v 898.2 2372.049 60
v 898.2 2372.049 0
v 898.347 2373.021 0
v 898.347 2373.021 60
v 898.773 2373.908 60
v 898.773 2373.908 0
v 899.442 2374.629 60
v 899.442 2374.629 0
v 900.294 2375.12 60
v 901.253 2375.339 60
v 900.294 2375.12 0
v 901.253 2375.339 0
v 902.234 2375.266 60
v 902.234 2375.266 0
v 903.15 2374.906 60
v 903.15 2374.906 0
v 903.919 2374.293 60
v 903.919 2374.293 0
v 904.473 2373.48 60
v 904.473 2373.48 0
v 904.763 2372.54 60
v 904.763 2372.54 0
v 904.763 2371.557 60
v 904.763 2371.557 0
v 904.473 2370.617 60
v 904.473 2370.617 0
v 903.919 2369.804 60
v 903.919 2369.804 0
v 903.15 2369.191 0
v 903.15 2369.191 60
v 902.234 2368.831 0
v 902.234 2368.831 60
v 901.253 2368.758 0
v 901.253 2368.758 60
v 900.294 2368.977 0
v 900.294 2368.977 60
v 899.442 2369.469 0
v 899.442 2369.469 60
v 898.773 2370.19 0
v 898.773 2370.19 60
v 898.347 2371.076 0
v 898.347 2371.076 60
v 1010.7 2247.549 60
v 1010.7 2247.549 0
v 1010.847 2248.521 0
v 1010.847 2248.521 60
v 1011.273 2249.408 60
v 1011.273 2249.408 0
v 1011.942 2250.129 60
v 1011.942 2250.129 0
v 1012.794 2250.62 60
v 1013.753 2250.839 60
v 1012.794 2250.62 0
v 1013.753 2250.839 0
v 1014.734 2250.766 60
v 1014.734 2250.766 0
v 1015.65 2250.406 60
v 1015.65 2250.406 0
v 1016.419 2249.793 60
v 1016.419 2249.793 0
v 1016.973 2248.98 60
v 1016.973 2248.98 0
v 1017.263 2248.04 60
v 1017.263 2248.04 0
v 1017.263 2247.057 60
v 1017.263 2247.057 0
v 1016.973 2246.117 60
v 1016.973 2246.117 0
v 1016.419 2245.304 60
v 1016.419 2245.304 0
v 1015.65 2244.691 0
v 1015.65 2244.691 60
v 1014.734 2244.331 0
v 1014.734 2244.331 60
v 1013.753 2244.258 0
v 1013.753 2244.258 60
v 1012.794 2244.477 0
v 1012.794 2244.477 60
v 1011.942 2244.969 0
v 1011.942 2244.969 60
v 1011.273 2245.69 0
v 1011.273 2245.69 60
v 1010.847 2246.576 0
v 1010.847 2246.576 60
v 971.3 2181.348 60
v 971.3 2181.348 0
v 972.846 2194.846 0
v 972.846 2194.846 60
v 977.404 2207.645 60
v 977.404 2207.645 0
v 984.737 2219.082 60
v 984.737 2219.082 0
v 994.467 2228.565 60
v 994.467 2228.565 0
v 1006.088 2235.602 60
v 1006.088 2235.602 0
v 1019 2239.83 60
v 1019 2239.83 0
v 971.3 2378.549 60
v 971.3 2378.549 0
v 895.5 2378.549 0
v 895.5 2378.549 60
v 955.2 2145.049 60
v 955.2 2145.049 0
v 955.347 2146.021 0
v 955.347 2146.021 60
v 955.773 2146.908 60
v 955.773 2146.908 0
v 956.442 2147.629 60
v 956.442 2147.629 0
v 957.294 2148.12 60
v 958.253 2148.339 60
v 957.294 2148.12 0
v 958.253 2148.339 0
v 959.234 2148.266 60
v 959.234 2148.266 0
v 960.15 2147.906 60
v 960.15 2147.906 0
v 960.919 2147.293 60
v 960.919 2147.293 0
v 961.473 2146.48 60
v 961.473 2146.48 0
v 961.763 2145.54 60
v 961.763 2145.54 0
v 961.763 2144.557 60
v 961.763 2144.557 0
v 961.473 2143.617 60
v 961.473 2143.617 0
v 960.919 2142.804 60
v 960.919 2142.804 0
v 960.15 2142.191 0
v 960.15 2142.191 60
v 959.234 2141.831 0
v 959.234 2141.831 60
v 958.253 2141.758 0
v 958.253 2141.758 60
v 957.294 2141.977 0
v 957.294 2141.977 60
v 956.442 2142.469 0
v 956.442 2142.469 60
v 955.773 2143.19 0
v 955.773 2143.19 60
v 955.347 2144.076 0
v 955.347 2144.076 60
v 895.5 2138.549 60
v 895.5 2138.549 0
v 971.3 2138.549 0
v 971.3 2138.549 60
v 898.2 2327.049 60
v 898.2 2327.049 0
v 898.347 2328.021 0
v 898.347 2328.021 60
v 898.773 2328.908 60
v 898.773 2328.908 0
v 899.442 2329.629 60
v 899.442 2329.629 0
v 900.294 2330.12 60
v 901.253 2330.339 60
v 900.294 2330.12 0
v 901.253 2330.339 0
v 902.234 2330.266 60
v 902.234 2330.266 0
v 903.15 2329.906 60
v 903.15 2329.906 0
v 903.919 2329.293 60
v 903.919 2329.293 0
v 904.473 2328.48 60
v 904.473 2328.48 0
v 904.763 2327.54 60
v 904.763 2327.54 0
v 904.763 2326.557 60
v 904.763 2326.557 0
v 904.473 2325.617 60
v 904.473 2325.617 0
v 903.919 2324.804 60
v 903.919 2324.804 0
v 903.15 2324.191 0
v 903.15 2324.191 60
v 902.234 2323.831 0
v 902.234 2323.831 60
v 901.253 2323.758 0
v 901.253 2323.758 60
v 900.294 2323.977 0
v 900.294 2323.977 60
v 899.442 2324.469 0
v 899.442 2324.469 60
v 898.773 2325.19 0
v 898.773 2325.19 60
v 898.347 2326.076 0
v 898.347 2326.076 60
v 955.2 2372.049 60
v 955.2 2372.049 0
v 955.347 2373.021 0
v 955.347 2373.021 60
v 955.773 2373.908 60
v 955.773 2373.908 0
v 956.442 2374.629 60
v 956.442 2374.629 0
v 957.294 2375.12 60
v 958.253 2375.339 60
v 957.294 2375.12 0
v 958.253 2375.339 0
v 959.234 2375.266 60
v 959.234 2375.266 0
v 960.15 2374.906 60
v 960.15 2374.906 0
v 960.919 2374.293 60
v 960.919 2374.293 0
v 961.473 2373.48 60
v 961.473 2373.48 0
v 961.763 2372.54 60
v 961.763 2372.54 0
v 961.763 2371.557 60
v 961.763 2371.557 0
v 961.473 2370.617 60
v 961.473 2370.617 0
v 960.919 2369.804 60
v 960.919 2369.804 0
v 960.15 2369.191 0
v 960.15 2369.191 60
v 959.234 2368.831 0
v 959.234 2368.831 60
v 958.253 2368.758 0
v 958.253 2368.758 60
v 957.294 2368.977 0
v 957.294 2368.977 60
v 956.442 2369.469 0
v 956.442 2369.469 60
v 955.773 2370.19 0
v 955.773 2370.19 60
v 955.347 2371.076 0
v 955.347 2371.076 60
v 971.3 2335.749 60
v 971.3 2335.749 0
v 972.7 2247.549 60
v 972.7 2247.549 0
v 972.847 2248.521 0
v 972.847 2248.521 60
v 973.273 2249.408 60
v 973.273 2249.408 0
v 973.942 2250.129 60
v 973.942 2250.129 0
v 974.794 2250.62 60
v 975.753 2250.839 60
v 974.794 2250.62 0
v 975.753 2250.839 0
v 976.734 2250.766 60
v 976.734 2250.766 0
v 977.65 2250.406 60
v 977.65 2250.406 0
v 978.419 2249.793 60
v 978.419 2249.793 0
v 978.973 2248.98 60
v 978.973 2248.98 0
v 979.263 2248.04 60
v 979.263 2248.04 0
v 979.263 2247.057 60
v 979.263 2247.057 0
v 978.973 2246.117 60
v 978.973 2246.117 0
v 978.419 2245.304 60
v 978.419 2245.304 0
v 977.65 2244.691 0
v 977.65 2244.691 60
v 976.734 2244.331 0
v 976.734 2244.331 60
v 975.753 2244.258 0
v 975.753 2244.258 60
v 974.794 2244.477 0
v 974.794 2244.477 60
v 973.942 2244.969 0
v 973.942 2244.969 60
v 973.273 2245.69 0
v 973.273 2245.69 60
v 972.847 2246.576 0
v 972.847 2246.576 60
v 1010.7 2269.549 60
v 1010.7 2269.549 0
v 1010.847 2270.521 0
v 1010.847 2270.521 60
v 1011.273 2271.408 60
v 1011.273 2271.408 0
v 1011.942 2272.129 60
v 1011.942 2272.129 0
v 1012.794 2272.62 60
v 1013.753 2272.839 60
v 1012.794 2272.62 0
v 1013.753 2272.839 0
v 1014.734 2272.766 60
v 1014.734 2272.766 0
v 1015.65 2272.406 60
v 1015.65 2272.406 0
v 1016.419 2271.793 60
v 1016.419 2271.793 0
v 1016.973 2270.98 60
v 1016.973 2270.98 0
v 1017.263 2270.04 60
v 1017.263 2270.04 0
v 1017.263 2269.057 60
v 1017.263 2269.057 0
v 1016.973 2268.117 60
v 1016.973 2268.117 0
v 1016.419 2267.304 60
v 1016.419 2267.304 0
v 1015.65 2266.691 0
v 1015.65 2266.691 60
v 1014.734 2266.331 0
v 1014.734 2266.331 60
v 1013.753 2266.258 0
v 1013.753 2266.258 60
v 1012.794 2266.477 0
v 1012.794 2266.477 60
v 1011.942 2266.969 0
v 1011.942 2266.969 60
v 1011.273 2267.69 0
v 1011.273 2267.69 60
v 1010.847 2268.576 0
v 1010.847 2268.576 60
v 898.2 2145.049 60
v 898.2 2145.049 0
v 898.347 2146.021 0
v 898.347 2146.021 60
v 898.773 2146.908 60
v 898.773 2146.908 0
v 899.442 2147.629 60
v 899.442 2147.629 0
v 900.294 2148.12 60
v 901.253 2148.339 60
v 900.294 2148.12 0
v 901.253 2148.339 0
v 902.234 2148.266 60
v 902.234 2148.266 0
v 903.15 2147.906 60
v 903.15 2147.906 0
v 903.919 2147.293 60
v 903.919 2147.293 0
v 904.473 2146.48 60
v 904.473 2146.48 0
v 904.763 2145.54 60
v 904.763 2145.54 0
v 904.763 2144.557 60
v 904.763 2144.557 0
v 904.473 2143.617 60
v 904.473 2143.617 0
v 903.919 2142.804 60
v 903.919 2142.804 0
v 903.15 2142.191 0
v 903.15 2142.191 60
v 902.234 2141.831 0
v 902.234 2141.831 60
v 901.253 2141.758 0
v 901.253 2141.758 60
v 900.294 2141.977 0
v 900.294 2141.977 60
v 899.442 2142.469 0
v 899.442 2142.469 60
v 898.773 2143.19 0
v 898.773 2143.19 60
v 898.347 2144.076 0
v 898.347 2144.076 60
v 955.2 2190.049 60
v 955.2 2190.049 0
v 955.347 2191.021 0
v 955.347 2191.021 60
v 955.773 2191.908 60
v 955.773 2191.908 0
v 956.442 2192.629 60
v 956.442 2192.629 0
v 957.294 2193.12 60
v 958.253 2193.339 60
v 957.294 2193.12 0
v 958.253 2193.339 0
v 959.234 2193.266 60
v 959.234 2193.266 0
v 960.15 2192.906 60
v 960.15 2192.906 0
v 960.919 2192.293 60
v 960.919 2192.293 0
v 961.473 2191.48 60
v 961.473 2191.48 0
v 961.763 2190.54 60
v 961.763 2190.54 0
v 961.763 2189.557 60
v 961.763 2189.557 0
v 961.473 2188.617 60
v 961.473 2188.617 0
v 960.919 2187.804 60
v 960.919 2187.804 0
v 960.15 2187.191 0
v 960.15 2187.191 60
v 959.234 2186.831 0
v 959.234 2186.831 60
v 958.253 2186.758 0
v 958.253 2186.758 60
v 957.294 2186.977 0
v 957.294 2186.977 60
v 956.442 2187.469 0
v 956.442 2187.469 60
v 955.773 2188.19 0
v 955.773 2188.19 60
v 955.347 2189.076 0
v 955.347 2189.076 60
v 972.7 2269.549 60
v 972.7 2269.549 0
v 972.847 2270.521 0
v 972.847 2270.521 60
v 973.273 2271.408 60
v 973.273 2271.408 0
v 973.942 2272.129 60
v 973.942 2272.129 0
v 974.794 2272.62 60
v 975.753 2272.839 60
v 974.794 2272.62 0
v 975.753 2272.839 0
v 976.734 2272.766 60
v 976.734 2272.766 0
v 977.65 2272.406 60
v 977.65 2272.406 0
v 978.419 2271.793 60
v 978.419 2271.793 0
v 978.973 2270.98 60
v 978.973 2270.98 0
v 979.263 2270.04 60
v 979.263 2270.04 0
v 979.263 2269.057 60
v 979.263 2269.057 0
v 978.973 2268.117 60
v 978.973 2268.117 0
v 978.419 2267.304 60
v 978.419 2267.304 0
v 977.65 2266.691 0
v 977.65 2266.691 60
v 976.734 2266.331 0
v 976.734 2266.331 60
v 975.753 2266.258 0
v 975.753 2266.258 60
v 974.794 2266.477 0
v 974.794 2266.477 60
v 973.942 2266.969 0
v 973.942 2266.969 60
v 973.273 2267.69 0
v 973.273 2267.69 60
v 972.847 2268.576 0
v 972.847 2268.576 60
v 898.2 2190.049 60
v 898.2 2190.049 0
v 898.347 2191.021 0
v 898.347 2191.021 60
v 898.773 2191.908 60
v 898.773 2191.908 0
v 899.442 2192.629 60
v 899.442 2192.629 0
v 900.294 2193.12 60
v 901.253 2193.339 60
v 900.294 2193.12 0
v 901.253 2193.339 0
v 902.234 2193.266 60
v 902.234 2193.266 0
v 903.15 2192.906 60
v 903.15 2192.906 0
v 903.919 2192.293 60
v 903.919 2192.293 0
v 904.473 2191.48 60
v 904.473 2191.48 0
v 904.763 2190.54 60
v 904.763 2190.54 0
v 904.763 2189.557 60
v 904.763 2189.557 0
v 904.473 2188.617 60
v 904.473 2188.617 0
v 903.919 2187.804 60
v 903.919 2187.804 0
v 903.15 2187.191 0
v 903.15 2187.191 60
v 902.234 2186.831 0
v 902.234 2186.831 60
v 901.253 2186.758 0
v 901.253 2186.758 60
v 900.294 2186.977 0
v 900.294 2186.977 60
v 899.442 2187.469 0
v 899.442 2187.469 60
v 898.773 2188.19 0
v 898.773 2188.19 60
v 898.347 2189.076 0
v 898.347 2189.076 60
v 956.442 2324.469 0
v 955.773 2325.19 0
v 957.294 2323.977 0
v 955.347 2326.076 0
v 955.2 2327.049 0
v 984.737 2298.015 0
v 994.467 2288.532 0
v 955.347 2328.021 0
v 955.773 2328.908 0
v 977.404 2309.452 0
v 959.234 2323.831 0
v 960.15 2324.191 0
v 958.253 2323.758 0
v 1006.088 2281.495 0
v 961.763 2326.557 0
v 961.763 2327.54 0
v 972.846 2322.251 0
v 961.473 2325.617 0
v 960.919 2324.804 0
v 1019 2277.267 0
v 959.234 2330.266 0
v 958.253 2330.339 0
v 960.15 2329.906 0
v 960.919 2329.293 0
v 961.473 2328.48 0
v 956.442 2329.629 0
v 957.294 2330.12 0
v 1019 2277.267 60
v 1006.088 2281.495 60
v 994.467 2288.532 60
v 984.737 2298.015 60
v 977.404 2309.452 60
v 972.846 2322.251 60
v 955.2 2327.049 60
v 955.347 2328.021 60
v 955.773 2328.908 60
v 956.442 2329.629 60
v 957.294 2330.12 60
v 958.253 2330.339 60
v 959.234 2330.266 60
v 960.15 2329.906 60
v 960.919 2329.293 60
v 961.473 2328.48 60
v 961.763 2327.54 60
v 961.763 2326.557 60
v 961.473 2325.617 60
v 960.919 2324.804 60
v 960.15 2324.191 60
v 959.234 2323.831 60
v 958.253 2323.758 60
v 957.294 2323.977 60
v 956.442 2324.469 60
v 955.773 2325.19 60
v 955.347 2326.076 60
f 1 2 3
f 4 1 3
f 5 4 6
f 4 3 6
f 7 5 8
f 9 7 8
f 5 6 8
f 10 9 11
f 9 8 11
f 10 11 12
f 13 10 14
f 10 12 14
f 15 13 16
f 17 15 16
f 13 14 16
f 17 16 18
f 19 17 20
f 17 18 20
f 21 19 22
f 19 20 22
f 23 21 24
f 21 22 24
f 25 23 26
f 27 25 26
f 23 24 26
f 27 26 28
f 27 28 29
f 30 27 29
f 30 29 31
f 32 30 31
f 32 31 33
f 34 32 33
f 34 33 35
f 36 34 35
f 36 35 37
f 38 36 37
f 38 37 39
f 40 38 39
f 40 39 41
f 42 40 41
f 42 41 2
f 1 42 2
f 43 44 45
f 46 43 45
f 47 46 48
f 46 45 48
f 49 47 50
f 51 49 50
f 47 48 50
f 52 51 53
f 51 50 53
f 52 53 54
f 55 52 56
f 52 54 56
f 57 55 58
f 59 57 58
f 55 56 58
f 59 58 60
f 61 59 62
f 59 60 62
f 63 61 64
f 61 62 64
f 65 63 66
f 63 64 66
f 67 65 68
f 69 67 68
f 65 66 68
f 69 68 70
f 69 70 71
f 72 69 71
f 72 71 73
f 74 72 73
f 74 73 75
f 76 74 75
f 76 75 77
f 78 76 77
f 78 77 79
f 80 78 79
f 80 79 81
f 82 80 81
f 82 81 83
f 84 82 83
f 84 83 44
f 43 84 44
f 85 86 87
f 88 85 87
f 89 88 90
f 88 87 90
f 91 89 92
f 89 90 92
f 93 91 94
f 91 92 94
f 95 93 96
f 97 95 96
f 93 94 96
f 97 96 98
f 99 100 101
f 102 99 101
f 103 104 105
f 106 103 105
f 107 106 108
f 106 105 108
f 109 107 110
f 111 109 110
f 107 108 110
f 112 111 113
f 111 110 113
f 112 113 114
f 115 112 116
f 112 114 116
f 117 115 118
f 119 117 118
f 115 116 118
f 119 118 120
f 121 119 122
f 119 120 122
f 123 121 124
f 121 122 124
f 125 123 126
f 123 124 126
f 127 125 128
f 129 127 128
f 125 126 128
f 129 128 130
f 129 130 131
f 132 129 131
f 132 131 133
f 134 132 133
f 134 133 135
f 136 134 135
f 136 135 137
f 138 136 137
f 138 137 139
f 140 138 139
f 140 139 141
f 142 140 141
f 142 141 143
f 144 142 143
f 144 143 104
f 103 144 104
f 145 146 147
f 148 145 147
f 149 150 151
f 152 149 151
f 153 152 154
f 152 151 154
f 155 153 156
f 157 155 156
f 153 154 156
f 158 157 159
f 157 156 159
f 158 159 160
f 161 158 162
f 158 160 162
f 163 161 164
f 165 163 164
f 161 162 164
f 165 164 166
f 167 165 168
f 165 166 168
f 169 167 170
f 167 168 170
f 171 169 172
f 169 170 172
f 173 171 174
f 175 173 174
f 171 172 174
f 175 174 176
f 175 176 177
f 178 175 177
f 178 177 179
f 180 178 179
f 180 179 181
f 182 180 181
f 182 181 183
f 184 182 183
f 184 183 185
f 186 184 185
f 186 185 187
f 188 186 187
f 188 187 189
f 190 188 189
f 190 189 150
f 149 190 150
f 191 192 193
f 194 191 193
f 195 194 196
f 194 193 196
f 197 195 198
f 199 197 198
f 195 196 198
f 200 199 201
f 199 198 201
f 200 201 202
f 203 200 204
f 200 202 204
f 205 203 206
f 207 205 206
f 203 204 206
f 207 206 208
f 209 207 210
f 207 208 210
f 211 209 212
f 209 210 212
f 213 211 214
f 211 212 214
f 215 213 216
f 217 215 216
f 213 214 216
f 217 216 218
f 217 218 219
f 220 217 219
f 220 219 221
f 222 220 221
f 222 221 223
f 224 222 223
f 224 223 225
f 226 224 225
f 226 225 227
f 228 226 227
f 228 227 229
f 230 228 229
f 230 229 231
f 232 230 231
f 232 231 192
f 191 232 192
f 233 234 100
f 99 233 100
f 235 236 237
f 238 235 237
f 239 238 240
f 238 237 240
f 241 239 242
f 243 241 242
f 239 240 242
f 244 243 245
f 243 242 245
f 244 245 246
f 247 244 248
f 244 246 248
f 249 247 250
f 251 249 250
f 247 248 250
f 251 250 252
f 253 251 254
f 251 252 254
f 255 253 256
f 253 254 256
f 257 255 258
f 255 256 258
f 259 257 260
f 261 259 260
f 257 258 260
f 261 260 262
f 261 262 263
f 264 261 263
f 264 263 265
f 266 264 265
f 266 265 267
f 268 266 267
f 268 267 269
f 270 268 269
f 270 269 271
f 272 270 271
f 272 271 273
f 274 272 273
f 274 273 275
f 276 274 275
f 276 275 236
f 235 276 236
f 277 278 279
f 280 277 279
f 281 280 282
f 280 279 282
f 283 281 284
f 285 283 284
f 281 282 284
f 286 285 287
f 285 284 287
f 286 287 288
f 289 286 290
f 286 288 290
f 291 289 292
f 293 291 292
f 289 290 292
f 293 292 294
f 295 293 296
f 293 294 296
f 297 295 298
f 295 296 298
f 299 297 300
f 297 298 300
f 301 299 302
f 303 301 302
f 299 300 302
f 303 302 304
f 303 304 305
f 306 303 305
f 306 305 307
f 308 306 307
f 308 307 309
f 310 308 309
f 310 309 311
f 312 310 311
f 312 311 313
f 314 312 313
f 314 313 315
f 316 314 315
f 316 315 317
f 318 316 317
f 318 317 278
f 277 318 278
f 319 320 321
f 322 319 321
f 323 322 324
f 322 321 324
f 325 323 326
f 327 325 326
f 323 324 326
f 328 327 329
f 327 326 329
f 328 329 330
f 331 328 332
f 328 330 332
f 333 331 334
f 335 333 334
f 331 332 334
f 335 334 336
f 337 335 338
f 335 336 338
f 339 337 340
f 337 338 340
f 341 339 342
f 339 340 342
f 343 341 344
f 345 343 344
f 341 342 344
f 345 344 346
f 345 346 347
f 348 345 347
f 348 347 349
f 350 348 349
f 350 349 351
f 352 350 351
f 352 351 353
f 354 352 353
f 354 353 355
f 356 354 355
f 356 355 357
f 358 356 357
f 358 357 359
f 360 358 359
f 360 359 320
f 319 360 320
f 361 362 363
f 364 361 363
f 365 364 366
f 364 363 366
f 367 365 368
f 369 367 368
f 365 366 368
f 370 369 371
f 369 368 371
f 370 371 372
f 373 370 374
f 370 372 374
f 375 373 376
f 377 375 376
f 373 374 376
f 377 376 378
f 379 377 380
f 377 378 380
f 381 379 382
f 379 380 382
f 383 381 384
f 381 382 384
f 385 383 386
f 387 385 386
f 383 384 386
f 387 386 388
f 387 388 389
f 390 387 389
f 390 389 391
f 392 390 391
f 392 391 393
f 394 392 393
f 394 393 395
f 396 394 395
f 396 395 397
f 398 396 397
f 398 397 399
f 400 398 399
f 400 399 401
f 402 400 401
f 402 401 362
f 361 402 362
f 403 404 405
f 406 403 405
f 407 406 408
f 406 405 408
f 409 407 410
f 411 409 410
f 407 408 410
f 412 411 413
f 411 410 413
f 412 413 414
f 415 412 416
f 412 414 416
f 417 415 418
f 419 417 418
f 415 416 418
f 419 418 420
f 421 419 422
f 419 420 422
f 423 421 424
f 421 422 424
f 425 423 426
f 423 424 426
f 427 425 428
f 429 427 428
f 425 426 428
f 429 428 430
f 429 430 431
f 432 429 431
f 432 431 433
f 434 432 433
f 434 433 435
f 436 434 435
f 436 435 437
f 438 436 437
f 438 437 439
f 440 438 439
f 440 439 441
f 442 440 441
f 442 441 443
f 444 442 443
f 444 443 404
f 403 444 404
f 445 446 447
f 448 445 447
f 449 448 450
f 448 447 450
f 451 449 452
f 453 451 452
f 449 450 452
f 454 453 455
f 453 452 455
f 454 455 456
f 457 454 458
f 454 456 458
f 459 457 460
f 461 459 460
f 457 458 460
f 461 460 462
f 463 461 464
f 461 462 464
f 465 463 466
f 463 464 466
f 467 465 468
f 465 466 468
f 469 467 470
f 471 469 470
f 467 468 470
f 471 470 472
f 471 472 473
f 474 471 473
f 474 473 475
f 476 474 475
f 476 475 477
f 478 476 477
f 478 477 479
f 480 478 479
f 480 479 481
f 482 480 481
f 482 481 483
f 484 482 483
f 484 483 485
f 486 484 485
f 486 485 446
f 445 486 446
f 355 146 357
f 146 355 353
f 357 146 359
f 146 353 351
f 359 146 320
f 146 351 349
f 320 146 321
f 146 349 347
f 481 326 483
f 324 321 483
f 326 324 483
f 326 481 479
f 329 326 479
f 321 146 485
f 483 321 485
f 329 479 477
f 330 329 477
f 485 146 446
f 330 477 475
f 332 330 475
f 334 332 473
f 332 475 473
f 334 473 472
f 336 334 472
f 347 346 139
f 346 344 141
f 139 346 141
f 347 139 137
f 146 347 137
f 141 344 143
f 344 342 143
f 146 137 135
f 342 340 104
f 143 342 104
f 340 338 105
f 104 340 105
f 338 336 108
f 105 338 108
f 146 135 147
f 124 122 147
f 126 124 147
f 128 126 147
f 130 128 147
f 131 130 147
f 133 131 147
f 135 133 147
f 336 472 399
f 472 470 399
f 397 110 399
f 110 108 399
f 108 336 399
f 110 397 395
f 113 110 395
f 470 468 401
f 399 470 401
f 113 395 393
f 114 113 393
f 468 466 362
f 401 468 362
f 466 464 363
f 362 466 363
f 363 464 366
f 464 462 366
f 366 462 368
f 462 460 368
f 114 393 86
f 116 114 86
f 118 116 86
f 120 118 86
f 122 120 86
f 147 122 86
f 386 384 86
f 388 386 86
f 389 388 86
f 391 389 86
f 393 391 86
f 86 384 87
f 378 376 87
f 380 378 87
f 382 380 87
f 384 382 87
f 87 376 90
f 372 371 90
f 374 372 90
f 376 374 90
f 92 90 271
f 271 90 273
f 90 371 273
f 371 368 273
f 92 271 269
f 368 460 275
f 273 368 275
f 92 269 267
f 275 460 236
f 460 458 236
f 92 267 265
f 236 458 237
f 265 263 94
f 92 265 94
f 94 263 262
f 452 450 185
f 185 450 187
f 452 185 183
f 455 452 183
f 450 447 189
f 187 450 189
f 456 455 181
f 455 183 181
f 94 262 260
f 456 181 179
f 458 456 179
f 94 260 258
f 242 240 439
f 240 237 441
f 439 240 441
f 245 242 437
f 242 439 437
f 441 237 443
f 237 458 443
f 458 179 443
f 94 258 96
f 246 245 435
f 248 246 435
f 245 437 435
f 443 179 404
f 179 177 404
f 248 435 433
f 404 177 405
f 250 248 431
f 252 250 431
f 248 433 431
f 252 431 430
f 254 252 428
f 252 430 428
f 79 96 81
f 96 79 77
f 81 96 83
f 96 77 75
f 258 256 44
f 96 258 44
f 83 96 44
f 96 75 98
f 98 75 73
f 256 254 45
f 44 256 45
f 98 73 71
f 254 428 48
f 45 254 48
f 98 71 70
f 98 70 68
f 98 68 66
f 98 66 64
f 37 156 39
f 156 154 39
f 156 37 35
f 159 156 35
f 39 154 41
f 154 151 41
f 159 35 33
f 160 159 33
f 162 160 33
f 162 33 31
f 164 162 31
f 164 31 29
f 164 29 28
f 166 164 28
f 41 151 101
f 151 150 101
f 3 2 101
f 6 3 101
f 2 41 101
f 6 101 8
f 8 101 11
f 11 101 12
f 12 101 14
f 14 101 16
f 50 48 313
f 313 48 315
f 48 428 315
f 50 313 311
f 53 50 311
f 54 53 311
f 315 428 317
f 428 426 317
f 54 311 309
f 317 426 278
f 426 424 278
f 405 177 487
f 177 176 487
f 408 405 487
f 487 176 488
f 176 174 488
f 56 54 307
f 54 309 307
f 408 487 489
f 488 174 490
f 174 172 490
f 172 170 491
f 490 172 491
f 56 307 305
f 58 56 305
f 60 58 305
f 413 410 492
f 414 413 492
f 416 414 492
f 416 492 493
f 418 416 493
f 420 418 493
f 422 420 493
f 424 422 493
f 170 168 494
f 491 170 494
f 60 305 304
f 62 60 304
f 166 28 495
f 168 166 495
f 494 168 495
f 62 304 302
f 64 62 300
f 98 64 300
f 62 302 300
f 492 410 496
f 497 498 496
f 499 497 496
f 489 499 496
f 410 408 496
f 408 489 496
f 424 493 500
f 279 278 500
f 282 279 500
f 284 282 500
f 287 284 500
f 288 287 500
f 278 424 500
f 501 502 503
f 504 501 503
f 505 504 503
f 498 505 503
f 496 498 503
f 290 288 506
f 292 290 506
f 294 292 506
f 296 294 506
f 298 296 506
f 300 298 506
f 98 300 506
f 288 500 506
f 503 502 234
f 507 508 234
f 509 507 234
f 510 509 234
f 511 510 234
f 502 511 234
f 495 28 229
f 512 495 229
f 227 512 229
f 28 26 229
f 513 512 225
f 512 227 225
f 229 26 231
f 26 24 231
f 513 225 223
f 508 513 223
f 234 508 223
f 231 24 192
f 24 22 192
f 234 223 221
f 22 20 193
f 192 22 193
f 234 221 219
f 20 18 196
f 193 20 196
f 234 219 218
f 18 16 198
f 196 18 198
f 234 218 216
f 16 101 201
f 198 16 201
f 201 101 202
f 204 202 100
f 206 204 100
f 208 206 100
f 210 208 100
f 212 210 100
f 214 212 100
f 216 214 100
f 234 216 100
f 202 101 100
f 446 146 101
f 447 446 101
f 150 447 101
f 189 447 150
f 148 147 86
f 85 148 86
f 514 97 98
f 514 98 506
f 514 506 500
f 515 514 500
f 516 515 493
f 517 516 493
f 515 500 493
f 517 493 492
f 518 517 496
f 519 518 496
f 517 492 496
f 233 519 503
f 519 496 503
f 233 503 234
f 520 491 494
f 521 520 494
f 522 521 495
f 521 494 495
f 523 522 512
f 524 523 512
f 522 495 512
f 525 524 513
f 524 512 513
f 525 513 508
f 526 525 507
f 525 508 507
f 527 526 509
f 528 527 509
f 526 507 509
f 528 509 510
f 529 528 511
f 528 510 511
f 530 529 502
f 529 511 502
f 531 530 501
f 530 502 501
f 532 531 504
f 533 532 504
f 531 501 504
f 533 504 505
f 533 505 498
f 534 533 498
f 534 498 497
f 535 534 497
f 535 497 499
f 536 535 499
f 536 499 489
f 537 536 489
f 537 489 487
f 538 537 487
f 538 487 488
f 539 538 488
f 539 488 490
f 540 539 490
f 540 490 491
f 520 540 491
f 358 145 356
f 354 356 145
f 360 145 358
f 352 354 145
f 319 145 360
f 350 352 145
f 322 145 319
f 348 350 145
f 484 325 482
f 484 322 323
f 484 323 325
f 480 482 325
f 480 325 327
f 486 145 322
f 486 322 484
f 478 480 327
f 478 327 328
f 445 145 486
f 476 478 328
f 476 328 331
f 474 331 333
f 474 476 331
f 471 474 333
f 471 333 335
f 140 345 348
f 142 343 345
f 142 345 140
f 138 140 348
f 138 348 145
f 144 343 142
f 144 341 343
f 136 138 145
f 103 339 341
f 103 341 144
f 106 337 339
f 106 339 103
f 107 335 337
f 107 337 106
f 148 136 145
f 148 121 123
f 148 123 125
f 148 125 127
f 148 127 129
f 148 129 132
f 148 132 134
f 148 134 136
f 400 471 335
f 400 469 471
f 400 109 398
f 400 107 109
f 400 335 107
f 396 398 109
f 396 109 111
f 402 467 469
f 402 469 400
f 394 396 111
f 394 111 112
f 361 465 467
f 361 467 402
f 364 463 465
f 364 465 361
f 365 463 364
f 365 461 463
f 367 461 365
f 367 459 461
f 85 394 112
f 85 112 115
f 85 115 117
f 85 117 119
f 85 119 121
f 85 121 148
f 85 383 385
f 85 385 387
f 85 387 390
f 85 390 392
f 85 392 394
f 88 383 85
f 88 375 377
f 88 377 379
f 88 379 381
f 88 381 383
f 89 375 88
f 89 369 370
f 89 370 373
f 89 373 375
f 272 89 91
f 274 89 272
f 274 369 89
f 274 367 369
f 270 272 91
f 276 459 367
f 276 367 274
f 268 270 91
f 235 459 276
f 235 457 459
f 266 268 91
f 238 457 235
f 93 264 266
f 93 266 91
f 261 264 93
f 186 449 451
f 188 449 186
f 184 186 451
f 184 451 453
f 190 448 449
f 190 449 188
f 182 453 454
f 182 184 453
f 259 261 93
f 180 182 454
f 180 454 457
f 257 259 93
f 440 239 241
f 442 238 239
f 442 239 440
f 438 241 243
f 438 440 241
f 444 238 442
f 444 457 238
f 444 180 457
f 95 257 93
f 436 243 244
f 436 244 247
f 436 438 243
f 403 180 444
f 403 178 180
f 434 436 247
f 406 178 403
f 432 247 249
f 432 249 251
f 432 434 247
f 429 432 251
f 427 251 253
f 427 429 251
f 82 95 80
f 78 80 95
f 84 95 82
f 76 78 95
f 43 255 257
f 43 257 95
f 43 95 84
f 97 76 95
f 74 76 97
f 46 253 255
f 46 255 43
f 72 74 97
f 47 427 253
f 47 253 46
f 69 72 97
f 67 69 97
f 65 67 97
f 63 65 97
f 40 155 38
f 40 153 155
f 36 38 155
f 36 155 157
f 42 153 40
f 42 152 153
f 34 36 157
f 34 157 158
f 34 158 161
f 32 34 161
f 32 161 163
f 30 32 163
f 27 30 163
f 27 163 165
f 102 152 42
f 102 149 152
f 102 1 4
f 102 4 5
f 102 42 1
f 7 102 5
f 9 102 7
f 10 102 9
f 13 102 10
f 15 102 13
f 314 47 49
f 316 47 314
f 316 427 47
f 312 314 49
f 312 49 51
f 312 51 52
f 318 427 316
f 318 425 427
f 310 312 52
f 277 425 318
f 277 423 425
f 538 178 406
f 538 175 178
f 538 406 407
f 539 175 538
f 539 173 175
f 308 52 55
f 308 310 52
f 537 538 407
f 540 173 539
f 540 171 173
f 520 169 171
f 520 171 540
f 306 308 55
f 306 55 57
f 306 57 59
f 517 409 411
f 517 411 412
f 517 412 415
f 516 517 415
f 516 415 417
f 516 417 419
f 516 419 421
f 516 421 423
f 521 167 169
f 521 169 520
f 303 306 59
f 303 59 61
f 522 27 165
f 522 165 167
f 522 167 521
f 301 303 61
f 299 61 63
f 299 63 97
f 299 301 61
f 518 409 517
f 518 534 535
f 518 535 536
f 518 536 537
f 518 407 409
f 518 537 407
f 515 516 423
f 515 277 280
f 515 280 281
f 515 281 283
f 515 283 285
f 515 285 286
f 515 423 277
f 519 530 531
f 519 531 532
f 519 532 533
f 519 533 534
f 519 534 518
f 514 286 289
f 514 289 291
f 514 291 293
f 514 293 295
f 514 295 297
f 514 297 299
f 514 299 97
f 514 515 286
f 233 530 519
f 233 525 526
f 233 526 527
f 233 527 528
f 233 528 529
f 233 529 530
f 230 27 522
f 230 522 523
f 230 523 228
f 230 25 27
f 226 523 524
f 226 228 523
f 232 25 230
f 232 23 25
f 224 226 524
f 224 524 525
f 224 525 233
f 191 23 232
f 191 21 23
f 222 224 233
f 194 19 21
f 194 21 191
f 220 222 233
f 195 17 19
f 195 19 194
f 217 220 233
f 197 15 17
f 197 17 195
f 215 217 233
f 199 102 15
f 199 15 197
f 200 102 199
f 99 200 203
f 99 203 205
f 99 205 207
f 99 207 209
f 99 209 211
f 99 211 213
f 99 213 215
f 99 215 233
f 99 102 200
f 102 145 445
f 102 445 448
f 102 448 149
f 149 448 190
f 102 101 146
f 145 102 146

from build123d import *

# Parameters (mm, degrees)
BOSS_EXTRUDE1_DEPTH  = 60
M6_CLEARANCE_HOLE1_D = 6.6


with BuildPart() as part:
    # Sketch1 → Boss-Extrude1 (new body)
    with BuildSketch(Plane.XY):
        with BuildLine():
            Line((971.299999999, 2378.548566852), (895.5, 2378.548566852))
            Line((895.5, 2378.548566852), (895.5, 2258.548566852))
            Line((895.5, 2258.548566852), (895.5, 2138.548566852))
            Line((895.5, 2138.548566852), (971.299999999, 2138.548566852))
            Line((971.299999999, 2138.548566852), (971.299999999, 2181.347801943))
            ThreePointArc((971.299999999, 2181.347801943), (984.737192979, 2219.081914402), (1018.999999999, 2239.829961379))
            Line((1018.999999999, 2239.829961379), (1018.999999999, 2277.267172325))
            ThreePointArc((1018.999999999, 2277.267172325), (984.737192979, 2298.015219302), (971.299999999, 2335.749331762))
            Line((971.299999999, 2335.749331762), (971.299999999, 2378.548566852))
        make_face()
    extrude(amount=BOSS_EXTRUDE1_DEPTH)

    # M6 Clearance Hole1 (through all)
    with Locations(Plane.XY.offset(60)):
        with Locations((901.5, 2145.048566852), (958.5, 2145.048566852), (958.5, 2190.048566852), (901.5, 2190.048566852), (901.5, 2372.048566852), (901.5, 2327.048566852), (958.5, 2327.048566852), (958.5, 2372.048566852), (1013.999999999, 2247.548566852), (1013.999999999, 2269.548566852), (975.999999999, 2247.548566852), (975.999999999, 2269.548566852)):
            Hole(M6_CLEARANCE_HOLE1_D / 2)


solid = part.part
